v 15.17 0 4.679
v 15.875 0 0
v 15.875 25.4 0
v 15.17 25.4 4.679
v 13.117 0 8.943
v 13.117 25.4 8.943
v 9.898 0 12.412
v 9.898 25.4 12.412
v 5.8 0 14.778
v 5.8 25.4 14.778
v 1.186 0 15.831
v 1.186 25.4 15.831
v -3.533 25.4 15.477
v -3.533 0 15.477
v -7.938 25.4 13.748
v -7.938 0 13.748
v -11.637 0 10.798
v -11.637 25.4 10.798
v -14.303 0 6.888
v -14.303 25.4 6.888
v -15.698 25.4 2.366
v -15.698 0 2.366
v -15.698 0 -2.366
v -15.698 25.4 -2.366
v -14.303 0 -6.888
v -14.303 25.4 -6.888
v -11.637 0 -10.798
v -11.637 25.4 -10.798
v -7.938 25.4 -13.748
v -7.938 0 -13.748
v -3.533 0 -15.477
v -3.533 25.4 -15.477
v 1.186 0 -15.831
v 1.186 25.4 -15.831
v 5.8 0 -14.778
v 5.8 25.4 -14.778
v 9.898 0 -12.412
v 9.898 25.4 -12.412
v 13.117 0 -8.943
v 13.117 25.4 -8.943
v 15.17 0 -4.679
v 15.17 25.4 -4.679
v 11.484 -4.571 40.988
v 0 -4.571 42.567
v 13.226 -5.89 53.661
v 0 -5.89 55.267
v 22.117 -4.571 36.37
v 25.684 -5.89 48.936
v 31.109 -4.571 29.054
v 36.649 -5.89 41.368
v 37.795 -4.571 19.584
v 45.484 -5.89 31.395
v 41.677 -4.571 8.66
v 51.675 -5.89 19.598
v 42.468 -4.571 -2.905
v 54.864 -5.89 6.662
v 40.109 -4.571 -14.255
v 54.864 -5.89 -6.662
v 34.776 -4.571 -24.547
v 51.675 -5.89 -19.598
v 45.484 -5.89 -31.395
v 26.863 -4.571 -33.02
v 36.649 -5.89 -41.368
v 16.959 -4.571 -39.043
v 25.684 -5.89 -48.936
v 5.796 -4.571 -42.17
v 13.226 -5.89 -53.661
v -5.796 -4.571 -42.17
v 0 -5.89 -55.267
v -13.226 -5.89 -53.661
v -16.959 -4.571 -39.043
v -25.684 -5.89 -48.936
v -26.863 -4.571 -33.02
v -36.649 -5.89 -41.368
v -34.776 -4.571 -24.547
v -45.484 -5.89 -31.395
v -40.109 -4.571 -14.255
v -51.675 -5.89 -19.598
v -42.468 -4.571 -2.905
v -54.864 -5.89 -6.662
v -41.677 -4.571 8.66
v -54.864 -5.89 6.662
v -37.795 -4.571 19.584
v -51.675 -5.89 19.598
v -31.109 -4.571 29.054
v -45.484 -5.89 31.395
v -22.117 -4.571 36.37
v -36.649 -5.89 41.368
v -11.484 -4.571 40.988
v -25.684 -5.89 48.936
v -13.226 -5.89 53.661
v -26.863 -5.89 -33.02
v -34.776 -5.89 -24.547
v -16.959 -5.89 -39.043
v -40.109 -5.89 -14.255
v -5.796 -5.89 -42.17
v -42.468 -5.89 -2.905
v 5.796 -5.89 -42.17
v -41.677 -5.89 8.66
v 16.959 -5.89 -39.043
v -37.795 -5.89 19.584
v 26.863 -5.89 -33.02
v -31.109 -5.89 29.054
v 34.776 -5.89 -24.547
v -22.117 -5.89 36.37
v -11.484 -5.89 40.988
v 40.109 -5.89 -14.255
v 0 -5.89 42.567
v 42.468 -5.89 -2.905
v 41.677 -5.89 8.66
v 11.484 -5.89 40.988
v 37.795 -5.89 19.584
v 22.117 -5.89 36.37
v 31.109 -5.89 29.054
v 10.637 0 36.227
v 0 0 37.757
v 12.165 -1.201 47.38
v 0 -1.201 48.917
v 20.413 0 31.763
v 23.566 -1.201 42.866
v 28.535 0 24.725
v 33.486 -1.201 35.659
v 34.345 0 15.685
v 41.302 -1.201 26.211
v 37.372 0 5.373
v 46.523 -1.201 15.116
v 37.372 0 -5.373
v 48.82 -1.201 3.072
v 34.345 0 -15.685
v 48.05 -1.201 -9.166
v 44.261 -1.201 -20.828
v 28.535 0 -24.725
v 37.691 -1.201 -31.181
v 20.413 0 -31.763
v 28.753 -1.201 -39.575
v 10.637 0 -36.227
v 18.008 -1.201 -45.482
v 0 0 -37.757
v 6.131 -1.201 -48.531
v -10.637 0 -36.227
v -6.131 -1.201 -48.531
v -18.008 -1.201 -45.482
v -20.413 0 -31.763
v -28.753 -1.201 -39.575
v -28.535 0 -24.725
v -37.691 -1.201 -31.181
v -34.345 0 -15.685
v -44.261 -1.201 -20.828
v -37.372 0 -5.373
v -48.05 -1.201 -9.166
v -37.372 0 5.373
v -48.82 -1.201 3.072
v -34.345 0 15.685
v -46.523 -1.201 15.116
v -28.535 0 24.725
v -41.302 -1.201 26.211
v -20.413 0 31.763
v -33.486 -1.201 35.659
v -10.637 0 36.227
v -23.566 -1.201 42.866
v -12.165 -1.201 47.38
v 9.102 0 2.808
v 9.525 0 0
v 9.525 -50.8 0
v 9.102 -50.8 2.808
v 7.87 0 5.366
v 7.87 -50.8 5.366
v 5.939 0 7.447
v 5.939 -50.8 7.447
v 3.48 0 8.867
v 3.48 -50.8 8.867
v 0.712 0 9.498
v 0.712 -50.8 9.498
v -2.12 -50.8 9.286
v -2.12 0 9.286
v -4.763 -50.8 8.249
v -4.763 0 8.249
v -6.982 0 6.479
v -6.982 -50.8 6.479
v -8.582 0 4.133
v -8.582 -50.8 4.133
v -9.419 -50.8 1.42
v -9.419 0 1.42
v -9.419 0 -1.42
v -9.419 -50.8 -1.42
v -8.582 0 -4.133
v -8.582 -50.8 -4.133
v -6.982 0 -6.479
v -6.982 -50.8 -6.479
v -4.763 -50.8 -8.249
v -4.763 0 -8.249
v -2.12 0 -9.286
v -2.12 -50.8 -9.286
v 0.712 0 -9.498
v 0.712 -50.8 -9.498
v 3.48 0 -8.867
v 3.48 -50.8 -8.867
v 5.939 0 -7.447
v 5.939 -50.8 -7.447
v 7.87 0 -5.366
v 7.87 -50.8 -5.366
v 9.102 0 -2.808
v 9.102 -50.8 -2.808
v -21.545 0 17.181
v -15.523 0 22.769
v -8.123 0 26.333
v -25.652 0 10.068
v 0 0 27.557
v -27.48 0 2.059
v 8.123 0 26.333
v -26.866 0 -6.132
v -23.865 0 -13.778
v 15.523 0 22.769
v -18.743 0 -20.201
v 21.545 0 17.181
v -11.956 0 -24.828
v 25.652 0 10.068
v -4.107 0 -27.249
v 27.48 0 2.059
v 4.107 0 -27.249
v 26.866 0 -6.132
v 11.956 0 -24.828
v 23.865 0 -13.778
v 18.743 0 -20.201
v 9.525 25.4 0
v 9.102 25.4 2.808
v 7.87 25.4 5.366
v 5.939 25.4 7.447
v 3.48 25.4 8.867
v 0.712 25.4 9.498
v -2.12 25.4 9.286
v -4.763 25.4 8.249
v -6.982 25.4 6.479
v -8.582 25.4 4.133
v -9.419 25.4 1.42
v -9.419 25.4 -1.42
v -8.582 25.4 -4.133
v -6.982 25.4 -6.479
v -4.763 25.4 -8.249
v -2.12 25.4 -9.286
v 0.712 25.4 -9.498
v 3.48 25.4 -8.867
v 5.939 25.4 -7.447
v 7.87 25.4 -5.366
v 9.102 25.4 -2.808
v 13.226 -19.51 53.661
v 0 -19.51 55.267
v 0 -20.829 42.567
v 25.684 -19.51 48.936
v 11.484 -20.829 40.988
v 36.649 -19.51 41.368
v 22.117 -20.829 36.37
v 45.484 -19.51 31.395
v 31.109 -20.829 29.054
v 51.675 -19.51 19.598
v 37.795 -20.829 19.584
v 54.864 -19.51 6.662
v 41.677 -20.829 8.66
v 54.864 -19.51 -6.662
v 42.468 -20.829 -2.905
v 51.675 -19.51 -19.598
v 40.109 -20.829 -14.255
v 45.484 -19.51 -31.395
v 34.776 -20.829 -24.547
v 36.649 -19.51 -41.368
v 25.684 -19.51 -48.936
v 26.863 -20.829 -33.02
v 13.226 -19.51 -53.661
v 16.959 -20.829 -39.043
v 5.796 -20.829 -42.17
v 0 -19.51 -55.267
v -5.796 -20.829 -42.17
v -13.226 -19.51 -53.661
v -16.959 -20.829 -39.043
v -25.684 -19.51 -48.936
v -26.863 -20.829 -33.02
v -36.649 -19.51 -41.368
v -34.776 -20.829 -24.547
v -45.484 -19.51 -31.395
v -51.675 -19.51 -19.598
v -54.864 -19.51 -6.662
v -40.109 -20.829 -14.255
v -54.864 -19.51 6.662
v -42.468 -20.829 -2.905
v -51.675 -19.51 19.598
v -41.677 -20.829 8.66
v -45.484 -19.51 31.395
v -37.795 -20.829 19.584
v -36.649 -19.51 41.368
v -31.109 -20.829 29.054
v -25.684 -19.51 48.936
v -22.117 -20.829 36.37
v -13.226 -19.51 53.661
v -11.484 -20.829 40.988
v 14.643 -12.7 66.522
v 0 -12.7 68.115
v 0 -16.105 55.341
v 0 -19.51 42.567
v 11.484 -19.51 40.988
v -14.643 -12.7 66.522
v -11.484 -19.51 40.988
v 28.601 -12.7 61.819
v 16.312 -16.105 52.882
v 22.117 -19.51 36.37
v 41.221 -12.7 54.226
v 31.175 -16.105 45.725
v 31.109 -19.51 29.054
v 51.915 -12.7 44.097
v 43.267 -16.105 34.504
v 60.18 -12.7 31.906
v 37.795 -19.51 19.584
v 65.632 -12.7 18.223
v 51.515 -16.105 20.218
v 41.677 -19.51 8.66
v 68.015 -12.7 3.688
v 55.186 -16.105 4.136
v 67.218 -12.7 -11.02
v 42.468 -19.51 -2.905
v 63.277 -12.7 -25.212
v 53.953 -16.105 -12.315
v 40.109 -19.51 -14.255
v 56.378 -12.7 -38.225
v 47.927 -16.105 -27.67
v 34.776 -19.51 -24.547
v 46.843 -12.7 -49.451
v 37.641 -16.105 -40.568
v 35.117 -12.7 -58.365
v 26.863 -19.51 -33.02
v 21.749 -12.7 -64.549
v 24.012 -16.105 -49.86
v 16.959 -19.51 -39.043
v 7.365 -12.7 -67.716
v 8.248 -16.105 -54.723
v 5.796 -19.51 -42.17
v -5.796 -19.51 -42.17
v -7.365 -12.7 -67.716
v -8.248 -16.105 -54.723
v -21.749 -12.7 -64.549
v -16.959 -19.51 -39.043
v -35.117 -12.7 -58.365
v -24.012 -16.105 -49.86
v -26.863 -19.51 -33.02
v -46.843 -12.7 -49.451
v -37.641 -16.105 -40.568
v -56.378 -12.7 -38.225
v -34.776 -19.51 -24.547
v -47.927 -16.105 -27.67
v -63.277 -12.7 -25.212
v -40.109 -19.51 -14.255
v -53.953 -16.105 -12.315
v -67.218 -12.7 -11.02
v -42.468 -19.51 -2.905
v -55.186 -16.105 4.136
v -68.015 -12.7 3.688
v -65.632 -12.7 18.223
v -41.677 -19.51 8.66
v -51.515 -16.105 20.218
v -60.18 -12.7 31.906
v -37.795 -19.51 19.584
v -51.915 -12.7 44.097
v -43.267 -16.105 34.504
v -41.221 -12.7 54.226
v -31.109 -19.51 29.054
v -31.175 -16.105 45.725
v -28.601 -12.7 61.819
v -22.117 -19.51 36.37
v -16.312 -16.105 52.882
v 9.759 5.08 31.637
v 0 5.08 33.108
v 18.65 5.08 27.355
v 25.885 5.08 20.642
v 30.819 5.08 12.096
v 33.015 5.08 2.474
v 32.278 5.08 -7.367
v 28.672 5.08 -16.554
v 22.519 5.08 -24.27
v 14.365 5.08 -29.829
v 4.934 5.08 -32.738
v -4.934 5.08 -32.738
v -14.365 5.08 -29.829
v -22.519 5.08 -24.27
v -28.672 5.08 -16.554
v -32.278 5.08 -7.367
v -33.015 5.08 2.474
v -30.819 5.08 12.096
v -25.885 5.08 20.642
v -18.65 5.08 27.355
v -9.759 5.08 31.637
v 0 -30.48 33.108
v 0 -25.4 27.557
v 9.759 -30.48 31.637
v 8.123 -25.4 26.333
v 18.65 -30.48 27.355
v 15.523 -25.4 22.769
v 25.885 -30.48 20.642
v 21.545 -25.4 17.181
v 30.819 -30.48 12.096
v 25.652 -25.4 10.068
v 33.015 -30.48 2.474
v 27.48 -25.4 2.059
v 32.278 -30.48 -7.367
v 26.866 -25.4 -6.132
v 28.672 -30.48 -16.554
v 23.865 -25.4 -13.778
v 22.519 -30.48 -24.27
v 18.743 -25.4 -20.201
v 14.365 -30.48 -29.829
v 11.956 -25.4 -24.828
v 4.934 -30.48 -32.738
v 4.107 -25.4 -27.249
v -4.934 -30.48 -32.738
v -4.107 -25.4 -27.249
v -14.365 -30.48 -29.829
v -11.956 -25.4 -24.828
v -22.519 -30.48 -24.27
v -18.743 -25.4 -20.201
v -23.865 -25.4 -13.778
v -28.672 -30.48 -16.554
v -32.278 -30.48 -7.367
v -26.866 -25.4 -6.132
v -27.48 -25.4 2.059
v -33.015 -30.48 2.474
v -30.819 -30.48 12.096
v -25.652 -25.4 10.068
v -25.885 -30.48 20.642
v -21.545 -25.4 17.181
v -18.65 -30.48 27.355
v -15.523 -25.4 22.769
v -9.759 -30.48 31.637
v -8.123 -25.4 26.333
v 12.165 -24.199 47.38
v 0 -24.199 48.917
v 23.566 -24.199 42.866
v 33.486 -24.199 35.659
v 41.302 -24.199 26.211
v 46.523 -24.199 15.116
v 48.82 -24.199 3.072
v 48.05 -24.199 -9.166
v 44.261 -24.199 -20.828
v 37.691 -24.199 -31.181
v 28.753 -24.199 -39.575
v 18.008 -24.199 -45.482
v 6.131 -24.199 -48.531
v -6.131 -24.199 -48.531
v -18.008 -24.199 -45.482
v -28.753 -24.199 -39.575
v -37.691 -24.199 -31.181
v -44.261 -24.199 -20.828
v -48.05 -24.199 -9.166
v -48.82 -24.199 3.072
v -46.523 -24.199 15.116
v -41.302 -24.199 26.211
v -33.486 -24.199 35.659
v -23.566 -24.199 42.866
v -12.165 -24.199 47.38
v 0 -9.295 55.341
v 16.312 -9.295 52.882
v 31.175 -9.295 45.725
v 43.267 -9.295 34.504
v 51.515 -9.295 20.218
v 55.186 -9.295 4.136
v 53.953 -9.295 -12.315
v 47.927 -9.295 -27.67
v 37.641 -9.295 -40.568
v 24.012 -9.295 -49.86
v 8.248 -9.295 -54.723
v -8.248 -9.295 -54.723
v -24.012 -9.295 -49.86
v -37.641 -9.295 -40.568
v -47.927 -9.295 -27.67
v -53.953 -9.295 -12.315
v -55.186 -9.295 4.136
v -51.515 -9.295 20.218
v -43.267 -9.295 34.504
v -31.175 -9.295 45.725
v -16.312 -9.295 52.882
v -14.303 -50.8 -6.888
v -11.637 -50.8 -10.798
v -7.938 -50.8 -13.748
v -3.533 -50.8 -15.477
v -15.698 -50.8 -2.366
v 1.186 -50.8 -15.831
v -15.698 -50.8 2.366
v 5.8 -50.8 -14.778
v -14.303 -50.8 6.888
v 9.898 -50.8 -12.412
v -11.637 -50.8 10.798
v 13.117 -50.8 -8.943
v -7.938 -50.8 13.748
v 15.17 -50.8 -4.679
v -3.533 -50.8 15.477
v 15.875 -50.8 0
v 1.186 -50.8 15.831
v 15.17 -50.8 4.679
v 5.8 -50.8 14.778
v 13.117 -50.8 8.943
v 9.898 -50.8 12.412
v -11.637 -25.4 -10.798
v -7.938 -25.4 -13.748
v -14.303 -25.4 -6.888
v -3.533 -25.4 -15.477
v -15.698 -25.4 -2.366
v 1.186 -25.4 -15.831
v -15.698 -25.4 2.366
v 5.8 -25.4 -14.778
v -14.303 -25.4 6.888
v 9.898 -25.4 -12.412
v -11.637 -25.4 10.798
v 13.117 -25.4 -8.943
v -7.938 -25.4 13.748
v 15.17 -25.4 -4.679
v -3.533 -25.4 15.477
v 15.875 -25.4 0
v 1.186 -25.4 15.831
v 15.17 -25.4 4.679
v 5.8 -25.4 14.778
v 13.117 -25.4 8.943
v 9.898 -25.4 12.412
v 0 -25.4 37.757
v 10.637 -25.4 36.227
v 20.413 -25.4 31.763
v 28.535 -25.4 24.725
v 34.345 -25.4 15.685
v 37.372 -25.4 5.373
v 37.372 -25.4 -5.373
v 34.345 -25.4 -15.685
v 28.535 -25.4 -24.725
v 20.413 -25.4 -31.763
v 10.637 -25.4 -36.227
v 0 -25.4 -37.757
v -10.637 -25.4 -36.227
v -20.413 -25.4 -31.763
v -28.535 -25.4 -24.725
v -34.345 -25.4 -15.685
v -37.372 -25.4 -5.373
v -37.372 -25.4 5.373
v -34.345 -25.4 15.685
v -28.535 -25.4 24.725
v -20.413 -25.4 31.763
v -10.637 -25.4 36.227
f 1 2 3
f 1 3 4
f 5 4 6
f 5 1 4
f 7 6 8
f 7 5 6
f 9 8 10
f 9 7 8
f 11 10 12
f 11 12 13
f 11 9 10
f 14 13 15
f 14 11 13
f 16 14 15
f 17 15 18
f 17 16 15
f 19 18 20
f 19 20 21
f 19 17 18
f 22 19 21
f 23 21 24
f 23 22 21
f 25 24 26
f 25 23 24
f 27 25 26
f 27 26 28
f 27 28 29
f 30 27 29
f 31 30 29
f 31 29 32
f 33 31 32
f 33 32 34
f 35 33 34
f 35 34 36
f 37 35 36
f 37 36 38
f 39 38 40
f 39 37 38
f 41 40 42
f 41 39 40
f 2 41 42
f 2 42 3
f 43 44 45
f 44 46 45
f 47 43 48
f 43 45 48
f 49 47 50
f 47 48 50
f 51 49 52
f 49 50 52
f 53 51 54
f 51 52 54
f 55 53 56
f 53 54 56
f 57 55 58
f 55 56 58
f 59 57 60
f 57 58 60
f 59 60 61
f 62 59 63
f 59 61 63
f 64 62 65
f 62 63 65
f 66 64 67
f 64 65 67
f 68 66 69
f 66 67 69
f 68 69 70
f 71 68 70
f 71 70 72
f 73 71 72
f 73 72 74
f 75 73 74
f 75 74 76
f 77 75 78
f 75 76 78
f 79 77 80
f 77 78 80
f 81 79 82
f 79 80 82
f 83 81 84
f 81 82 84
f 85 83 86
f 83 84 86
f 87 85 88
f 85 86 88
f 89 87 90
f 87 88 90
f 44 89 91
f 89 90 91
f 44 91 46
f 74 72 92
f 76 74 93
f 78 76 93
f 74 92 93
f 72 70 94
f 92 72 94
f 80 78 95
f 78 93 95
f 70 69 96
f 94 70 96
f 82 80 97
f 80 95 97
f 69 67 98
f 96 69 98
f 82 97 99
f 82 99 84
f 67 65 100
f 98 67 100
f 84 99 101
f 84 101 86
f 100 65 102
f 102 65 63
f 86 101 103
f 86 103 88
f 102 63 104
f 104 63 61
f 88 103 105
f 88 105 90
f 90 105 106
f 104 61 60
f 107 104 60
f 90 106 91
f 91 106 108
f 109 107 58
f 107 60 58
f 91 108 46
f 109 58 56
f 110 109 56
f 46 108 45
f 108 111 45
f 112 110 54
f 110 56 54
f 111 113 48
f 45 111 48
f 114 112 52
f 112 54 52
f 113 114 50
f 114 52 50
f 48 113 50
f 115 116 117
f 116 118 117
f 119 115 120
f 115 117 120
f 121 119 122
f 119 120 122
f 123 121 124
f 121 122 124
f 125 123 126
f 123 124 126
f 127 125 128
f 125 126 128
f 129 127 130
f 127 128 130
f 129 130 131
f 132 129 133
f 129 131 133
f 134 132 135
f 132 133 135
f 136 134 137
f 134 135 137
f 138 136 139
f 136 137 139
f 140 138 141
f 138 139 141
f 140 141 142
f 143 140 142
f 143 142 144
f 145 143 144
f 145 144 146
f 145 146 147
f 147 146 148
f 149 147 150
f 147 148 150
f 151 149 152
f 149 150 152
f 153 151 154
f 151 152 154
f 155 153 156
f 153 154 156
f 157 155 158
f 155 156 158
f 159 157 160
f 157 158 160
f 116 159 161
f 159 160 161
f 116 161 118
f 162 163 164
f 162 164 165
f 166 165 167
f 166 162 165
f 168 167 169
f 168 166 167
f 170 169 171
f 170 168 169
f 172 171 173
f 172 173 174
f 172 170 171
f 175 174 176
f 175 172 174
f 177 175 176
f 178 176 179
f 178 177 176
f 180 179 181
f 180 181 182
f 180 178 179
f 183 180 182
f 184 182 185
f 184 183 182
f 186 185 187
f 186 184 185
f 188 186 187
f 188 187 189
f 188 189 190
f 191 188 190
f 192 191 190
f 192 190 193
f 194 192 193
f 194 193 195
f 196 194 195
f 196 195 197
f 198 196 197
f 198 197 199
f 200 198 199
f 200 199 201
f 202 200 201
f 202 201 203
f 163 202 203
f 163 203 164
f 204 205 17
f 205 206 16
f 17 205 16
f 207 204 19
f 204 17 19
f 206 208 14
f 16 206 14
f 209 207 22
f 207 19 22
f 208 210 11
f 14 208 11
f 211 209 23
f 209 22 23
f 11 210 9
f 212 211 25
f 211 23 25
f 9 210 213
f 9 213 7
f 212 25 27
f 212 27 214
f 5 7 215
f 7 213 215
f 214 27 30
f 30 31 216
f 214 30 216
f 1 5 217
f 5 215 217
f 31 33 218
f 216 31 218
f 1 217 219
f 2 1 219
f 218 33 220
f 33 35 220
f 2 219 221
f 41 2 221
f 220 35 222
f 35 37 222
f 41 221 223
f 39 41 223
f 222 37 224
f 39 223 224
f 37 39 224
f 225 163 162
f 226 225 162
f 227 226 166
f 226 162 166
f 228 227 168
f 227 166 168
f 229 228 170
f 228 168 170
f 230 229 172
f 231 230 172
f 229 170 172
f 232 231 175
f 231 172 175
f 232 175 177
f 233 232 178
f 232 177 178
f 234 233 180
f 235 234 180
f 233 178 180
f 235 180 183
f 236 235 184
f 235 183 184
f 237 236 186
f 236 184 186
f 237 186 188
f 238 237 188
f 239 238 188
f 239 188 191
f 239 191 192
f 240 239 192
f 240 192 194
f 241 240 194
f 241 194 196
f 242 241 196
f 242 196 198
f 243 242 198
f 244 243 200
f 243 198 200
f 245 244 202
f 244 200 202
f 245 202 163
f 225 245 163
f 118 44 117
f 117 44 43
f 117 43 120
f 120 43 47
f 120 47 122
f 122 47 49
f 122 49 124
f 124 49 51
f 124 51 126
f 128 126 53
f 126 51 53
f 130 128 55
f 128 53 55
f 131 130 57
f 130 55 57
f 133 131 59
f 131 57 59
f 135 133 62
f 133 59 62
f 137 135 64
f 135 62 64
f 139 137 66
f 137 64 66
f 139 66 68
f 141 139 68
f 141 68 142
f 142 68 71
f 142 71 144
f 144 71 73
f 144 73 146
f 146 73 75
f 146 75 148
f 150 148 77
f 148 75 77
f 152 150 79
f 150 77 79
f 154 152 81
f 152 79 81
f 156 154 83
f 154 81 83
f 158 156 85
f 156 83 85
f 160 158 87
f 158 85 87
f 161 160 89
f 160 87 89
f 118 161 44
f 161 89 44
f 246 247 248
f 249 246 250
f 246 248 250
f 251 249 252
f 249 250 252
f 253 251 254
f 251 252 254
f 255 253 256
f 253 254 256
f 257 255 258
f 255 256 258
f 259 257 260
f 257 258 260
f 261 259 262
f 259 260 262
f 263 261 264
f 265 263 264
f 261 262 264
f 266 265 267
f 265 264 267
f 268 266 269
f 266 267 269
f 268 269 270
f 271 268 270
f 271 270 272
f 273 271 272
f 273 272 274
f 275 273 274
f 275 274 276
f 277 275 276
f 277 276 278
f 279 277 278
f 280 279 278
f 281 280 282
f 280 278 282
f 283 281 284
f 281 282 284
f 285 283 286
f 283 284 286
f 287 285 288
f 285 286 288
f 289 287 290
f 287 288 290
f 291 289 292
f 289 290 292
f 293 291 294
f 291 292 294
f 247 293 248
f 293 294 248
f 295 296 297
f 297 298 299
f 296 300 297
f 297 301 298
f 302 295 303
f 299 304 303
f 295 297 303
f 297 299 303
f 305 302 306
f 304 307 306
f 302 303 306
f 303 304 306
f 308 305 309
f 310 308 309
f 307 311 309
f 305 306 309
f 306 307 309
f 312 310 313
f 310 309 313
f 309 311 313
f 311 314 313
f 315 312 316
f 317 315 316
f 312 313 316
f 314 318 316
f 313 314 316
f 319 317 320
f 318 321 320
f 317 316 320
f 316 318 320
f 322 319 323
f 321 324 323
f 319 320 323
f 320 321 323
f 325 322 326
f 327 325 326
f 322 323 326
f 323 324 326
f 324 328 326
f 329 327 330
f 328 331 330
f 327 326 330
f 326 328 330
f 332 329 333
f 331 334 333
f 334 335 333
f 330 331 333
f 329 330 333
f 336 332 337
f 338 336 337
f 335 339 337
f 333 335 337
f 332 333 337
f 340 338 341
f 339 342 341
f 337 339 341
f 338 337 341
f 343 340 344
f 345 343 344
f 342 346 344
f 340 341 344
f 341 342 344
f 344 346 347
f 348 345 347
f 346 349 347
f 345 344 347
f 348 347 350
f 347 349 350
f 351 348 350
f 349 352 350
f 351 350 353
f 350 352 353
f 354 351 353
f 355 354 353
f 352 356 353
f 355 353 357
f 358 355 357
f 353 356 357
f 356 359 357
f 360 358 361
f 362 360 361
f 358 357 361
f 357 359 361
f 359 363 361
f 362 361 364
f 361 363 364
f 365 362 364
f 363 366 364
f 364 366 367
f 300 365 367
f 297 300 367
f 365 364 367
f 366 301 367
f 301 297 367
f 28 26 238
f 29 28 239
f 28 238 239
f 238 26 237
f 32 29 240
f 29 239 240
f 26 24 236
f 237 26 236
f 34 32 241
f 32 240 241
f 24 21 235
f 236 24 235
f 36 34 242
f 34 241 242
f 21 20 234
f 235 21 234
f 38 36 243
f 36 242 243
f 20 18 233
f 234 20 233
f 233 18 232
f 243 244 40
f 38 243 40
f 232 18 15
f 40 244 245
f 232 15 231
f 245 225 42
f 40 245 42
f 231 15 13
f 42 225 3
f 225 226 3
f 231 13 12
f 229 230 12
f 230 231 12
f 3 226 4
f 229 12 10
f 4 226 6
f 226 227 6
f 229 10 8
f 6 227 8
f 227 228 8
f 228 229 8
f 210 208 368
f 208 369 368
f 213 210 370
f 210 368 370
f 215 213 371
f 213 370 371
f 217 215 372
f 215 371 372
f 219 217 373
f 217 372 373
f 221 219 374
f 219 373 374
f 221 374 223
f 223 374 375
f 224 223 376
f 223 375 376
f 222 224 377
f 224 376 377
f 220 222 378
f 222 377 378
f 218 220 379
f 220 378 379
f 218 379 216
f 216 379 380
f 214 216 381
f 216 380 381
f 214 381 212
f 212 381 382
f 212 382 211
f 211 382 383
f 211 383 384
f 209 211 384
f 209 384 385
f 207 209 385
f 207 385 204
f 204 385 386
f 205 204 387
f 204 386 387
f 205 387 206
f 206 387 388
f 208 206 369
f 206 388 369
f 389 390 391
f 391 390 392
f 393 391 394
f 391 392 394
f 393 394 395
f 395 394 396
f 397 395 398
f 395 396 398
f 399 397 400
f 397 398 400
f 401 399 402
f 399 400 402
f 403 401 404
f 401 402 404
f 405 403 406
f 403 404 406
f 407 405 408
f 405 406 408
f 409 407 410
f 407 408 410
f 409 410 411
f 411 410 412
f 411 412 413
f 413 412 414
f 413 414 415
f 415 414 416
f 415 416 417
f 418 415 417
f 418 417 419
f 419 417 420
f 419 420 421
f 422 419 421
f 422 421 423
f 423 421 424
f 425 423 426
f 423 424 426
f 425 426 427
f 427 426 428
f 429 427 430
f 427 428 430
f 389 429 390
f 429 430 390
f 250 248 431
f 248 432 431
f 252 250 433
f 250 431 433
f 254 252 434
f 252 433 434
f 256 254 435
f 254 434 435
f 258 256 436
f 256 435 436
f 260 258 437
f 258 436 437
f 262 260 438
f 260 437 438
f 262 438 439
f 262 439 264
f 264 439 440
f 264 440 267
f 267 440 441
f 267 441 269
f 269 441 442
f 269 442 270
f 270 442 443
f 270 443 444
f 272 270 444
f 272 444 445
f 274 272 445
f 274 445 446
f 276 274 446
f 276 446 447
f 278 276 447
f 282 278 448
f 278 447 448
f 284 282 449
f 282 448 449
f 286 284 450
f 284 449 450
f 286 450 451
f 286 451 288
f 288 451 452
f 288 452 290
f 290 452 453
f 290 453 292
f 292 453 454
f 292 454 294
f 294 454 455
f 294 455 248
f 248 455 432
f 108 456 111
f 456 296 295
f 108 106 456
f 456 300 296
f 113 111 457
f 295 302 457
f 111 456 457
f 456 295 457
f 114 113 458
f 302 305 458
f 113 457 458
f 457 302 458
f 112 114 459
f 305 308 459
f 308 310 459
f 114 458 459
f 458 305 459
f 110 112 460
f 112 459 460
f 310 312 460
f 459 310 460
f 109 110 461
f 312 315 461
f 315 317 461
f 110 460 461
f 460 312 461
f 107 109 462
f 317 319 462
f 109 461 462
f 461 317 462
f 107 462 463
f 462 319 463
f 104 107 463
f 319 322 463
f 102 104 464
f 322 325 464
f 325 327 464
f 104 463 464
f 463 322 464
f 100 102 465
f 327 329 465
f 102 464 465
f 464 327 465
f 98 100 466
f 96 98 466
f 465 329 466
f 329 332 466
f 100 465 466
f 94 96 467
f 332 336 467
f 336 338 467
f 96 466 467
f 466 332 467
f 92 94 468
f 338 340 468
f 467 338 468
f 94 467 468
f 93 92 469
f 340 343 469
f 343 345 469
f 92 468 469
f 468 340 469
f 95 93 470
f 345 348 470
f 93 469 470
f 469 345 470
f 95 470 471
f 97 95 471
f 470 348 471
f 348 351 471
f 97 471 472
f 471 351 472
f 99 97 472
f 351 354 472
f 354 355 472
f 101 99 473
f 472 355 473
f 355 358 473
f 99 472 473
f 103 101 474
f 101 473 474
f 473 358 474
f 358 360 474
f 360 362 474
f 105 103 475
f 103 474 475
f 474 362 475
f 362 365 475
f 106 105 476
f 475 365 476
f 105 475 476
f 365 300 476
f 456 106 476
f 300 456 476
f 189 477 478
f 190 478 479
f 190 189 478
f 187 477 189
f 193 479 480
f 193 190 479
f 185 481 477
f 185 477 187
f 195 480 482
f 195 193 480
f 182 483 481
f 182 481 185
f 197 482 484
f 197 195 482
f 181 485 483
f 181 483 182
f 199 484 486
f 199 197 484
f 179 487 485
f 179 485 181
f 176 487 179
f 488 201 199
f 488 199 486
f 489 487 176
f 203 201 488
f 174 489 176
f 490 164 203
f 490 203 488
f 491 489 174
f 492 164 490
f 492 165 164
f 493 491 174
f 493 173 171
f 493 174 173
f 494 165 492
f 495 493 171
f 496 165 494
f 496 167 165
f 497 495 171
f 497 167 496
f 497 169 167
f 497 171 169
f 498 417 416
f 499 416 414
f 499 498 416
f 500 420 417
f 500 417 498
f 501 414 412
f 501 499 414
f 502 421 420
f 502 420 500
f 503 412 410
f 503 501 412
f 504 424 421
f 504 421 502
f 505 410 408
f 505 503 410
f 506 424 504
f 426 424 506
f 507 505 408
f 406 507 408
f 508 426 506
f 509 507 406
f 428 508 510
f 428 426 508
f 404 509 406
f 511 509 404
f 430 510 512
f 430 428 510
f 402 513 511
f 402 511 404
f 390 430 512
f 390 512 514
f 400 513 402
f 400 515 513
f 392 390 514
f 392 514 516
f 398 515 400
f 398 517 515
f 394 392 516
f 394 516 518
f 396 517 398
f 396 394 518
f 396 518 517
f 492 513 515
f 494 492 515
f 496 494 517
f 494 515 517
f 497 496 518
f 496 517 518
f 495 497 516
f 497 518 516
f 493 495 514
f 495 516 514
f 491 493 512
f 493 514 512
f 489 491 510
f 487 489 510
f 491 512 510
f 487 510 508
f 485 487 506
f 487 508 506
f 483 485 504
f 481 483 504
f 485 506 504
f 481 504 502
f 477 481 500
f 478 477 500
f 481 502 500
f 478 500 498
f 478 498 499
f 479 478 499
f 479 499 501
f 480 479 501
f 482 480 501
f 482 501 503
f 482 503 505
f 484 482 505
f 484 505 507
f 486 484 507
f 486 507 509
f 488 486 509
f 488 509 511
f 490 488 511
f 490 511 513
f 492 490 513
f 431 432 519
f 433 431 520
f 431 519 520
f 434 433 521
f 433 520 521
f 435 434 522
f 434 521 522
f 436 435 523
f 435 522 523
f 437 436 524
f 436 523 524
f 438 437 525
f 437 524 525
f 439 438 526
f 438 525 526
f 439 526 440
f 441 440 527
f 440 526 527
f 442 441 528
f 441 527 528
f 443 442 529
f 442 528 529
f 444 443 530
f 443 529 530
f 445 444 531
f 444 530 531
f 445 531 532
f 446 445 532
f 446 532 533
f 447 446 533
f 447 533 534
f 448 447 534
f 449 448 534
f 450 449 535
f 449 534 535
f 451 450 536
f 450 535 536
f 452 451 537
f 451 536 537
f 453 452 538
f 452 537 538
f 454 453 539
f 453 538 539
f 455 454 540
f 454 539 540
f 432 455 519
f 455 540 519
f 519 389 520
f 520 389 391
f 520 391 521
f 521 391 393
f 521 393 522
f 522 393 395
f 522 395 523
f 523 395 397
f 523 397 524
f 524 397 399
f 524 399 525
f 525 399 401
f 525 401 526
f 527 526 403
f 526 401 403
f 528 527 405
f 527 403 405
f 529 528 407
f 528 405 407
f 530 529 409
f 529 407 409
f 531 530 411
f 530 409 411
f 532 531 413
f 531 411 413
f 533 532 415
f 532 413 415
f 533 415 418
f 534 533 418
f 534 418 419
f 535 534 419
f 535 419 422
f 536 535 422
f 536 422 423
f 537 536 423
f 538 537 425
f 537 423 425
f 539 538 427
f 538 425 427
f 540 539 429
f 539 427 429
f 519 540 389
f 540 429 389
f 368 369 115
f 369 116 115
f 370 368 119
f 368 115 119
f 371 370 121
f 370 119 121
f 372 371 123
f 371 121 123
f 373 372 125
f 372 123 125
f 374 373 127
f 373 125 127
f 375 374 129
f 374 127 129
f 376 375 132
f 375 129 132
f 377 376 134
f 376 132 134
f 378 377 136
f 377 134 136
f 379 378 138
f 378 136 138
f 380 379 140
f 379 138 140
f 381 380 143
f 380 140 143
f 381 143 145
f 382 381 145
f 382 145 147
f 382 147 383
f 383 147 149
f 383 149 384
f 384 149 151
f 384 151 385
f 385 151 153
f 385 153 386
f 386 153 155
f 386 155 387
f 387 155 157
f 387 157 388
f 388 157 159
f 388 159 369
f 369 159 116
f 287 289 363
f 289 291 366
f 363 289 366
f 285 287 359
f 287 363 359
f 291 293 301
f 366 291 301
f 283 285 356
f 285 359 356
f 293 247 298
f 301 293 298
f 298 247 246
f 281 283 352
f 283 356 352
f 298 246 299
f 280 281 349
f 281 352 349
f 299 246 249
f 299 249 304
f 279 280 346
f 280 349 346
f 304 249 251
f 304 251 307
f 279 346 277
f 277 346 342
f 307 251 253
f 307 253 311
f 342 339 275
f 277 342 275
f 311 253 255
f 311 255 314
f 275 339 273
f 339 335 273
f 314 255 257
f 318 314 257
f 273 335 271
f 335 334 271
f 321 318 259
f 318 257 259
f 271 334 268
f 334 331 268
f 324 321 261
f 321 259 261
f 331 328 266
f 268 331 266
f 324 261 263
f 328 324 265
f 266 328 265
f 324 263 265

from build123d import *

# Parameters (mm, degrees)
F0_R     = 15.875
F0_R_2   = 9.525
F1_DEPTH = 25.4
F4_DEPTH = 50.8
F5_DEPTH = 25.4


with BuildPart() as f1:
    # F0 (on Front) → F1 (new body)
    with BuildSketch(Plane.XZ):
        Circle(F0_R)
        Circle(F0_R_2, mode=Mode.SUBTRACT)
    extrude(amount=F1_DEPTH)

    # F2 (on Right) → F3 (revolve)
    with BuildSketch(Plane.YZ):
        Polygon((-25.4, 27.556808), (-25.4, 15.875), (-12.7, 15.875), (-12.7, 42.56691), (-19.509828, 42.56691), (-20.829493, 42.56691), (-25.4, 37.756736), (-25.4, 33.107586), align=None)
        Polygon((-12.7, 42.56691), (-12.7, 15.875), (0, 15.875), (0, 27.556808), (0, 33.107586), (0, 37.756736), (-1.200963, 48.91691), (-4.570507, 42.56691), (-5.890172, 42.56691), align=None)
        Polygon((0, 33.107586), (0, 27.556808), (5.08, 33.107586), align=None)
        Polygon((0, 33.107586), (5.08, 33.107586), (0, 37.756736), align=None)
        Polygon((-30.48, 33.107586), (-25.4, 27.556808), (-25.4, 33.107586), align=None)
        Polygon((-30.48, 33.107586), (-25.4, 33.107586), (-25.4, 37.756736), align=None)
        Polygon((-24.199037, 48.91691), (-25.4, 37.756736), (-20.829493, 42.56691), align=None)
        Polygon((-20.829493, 42.56691), (-19.509828, 42.56691), (-19.509828, 55.26691), align=None)
        Polygon((-19.509828, 42.56691), (-12.7, 42.56691), (-12.7, 68.114896), align=None)
        Polygon((-12.7, 68.114896), (-12.7, 42.56691), (-5.890172, 42.56691), align=None)
        Polygon((-5.890172, 55.26691), (-5.890172, 42.56691), (-4.570507, 42.56691), align=None)
    revolve(axis=Axis((0, 0, 0), (0, 1, 0)))

    # F0 (on Front) → F4 (join)
    with BuildSketch(Plane.XZ):
        Circle(F0_R)
        Circle(F0_R_2, mode=Mode.SUBTRACT)
    extrude(amount=F4_DEPTH)

    # F0 (on Front) → F5 (join)
    with BuildSketch(Plane.XZ):
        Circle(F0_R)
        Circle(F0_R_2, mode=Mode.SUBTRACT)
    extrude(amount=-F5_DEPTH)


solid = f1.part
